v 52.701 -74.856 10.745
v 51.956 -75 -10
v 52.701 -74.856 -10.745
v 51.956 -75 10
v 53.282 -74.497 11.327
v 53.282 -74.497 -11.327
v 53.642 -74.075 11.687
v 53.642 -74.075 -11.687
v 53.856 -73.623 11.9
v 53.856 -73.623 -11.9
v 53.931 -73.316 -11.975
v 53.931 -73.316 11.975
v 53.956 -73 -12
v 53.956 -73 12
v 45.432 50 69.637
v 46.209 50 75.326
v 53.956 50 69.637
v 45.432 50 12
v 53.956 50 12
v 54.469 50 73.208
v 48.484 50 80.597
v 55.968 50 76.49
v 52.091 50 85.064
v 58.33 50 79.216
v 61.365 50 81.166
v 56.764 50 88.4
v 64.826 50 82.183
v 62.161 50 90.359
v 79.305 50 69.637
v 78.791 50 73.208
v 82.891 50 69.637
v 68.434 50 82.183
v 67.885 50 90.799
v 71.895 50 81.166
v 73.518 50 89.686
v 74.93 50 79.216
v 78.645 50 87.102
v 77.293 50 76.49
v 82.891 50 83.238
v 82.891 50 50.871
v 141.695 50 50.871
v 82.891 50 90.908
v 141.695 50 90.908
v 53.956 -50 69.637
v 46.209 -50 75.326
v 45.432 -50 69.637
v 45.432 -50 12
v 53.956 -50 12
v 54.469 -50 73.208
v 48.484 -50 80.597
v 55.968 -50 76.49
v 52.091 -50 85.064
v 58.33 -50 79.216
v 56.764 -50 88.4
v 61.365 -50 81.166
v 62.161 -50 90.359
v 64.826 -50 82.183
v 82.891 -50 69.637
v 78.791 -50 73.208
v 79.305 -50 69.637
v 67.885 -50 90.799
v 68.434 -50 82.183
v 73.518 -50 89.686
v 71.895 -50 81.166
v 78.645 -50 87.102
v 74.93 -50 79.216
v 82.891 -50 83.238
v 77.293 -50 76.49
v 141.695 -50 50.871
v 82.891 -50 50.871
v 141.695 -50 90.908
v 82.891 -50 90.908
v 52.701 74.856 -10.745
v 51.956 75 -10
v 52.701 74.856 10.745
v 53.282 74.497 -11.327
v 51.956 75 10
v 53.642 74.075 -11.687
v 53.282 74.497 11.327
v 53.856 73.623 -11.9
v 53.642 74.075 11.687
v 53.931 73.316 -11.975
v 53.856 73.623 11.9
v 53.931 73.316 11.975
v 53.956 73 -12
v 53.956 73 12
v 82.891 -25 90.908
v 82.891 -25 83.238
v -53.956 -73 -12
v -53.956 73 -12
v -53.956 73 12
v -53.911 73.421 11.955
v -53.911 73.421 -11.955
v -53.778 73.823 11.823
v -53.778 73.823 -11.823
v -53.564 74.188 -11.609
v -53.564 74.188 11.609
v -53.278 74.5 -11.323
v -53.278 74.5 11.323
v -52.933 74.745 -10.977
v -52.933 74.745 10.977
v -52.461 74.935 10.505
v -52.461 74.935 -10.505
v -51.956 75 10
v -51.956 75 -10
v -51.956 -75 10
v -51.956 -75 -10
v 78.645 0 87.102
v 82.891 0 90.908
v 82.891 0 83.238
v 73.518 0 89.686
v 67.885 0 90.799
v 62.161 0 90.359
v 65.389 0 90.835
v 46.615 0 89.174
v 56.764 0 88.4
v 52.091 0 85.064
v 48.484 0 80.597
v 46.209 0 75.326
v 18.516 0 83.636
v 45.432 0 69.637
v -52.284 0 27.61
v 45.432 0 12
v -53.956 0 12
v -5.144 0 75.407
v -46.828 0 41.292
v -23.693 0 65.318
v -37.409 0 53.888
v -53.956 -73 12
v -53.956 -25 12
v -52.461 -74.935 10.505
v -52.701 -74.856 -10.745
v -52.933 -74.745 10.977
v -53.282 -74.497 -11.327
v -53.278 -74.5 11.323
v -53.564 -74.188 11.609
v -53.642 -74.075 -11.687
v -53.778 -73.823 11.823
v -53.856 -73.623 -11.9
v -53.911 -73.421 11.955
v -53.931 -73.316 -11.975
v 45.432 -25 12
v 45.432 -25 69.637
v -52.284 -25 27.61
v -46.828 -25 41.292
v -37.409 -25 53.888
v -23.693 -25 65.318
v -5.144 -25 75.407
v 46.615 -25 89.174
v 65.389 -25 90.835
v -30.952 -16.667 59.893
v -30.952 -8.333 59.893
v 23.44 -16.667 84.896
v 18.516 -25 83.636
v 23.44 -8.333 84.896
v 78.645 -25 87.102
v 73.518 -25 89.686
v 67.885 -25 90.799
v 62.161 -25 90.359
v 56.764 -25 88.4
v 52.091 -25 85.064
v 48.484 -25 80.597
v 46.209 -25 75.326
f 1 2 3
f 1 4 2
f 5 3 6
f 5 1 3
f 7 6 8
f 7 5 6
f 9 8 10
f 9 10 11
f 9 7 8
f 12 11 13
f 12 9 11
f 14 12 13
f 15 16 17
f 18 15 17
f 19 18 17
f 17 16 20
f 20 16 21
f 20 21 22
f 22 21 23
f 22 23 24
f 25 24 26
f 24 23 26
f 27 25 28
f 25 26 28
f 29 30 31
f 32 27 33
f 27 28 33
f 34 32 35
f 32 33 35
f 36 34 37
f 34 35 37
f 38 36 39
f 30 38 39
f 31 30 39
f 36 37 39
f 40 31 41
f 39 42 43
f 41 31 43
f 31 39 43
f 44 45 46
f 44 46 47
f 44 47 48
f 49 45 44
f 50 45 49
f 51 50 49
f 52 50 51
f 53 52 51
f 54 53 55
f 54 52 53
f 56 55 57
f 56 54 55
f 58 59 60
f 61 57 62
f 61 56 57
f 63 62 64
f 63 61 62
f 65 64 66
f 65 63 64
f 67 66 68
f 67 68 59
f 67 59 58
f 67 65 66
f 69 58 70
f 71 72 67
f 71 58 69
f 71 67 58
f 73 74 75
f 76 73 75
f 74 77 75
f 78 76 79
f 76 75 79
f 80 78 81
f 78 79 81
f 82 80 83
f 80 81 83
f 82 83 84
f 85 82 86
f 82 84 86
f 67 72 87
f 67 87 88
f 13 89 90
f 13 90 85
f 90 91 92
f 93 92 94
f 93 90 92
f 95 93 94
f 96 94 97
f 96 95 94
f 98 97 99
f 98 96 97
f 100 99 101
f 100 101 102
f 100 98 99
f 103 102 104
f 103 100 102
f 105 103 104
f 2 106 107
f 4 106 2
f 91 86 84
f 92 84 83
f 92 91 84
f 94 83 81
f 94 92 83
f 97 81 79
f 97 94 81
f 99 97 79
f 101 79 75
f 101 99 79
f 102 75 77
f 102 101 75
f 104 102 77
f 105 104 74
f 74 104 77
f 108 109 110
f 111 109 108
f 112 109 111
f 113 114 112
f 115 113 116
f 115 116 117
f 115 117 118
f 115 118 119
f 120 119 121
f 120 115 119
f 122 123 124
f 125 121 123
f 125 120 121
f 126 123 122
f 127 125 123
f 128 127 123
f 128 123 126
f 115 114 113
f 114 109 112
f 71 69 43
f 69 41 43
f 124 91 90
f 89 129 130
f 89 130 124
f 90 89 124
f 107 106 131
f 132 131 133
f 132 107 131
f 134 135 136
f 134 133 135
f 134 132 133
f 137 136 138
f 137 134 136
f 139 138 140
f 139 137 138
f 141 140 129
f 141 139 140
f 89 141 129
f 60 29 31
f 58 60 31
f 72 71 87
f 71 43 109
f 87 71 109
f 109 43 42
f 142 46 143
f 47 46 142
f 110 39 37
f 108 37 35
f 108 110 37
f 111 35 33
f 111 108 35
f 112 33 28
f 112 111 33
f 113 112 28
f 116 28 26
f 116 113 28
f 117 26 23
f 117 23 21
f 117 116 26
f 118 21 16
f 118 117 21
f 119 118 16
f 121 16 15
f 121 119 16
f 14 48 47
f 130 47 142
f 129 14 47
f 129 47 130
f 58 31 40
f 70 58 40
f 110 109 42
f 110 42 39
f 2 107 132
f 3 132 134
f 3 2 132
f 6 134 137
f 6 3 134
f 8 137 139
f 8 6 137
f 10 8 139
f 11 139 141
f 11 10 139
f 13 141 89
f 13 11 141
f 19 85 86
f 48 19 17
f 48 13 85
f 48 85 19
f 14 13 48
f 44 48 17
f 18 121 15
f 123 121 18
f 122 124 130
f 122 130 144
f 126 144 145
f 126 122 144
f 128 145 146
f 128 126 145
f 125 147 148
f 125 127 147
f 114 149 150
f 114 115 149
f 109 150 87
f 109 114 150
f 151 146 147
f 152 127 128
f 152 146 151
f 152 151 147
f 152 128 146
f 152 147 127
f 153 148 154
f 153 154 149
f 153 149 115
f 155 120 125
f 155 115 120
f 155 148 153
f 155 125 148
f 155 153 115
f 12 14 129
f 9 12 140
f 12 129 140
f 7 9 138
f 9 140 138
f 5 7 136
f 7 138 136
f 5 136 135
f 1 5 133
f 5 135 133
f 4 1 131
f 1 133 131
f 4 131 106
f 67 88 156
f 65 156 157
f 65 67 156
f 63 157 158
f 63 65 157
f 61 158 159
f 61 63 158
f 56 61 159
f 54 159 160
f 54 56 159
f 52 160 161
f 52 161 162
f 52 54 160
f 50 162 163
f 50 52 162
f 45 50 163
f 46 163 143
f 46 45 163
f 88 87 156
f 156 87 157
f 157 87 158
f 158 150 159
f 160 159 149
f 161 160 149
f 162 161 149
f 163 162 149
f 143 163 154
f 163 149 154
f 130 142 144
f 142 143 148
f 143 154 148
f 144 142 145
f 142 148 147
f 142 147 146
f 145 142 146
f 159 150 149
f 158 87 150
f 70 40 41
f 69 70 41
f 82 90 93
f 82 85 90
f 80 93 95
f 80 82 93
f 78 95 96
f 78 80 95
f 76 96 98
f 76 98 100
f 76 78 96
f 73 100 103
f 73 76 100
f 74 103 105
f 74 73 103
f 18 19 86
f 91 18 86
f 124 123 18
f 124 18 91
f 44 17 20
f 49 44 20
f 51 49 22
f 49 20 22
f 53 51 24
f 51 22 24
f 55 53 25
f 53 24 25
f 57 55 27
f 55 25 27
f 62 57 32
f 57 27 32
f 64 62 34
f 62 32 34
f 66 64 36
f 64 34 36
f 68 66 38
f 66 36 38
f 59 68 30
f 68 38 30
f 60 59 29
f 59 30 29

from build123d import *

# Parameters (mm, degrees)
F2_DEPTH = 50
F3_DEPTH = 25
F4_DEPTH = 25
F6_DEPTH = 75
F7_R     = 2


# Not quite as in the source:
# - the program builds the solid bodies; features that only make, move or delete a surface that nothing else refers to are left out


with BuildPart() as f2:
    # F0 (on Front) → F2 (new body, symmetric)
    with BuildSketch(Plane.XZ):
        with BuildLine():
            ThreePointArc((86.0395411487, 78.1614595205), (84.6450154703, 80.8109382584), (82.8911252312, 83.2375219638))
            Line((82.8911252312, 83.2375219638), (82.8911252312, 69.6372875124))
            Line((82.8911252312, 69.6372875124), (98.3350202441, 69.6372875124))
            Line((98.3350202441, 69.6372875124), (98.3350202441, 78.1614595205))
            Line((98.3350202441, 78.1614595205), (86.0395411487, 78.1614595205))
        make_face()
        with BuildLine():
            Line((141.6950114063, 90.9081755561), (82.8911252312, 90.9081755561))
            Line((82.8911252312, 90.9081755561), (82.8911252312, 83.2375219638))
            ThreePointArc((82.8911252312, 83.2375219638), (84.6450154703, 80.8109382584), (86.0395411487, 78.1614595205))
            Line((86.0395411487, 78.1614595205), (98.3350202441, 78.1614595205))
            Line((98.3350202441, 78.1614595205), (98.3350202441, 69.6372875124))
            Line((98.3350202441, 69.6372875124), (82.8911252312, 69.6372875124))
            Line((82.8911252312, 69.6372875124), (82.8911252312, 50.8714897913))
            Line((82.8911252312, 50.8714897913), (141.6950114063, 50.8714897913))
            Line((141.6950114063, 50.8714897913), (141.6950114063, 90.9081755561))
        make_face()
        with BuildLine():
            Line((45.431509614, 69.6372875124), (45.431509614, 12))
            Line((45.431509614, 12), (53.955681622, 12))
            Line((53.955681622, 12), (53.955681622, 69.6372875124))
            ThreePointArc((53.955681622, 69.6372875124), (66.6301945598, 82.3118004502), (79.3047074976, 69.6372875124))
            Line((79.3047074976, 69.6372875124), (82.8911252312, 69.6372875124))
            Line((82.8911252312, 69.6372875124), (82.8911252312, 83.2375219638))
            ThreePointArc((82.8911252312, 83.2375219638), (59.3957665519, 89.563333152), (45.431509614, 69.6372875124))
        make_face()
    extrude(amount=F2_DEPTH, both=True)

    # F0 (on Front) → F3 (join)
    with BuildSketch(Plane.XZ):
        with BuildLine():
            add(Edge.make_bspline(
                [(-53.955681622, 12), (-55.4214757867, 72.6385811269), (29.6854469925, 93.0915244818), (82.8911252312, 90.9081755561)],
                knots=[0, 0, 0, 0, 157.9669228526, 157.9669228526, 157.9669228526, 157.9669228526], degree=3))
            Line((-53.955681622, 12), (45.431509614, 12))
            Line((45.431509614, 12), (45.431509614, 69.6372875124))
            ThreePointArc((45.431509614, 69.6372875124), (59.3957665519, 89.563333152), (82.8911252312, 83.2375219638))
            Line((82.8911252312, 83.2375219638), (82.8911252312, 90.9081755561))
        make_face()
        Polygon((45.431509614, 12), (-53.955681622, 12), (-53.955681622, -12), (53.955681622, -12), (53.955681622, 12), align=None)
        with BuildLine():
            Line((45.431509614, 69.6372875124), (45.431509614, 12))
            Line((45.431509614, 12), (53.955681622, 12))
            Line((53.955681622, 12), (53.955681622, 69.6372875124))
            ThreePointArc((53.955681622, 69.6372875124), (66.6301945598, 82.3118004502), (79.3047074976, 69.6372875124))
            Line((79.3047074976, 69.6372875124), (82.8911252312, 69.6372875124))
            Line((82.8911252312, 69.6372875124), (82.8911252312, 83.2375219638))
            ThreePointArc((82.8911252312, 83.2375219638), (59.3957665519, 89.563333152), (45.431509614, 69.6372875124))
        make_face()
        with BuildLine():
            Line((141.6950114063, 90.9081755561), (82.8911252312, 90.9081755561))
            Line((82.8911252312, 90.9081755561), (82.8911252312, 83.2375219638))
            ThreePointArc((82.8911252312, 83.2375219638), (84.6450154703, 80.8109382584), (86.0395411487, 78.1614595205))
            Line((86.0395411487, 78.1614595205), (98.3350202441, 78.1614595205))
            Line((98.3350202441, 78.1614595205), (98.3350202441, 69.6372875124))
            Line((98.3350202441, 69.6372875124), (82.8911252312, 69.6372875124))
            Line((82.8911252312, 69.6372875124), (82.8911252312, 50.8714897913))
            Line((82.8911252312, 50.8714897913), (141.6950114063, 50.8714897913))
            Line((141.6950114063, 50.8714897913), (141.6950114063, 90.9081755561))
        make_face()
        with BuildLine():
            ThreePointArc((86.0395411487, 78.1614595205), (84.6450154703, 80.8109382584), (82.8911252312, 83.2375219638))
            Line((82.8911252312, 83.2375219638), (82.8911252312, 69.6372875124))
            Line((82.8911252312, 69.6372875124), (98.3350202441, 69.6372875124))
            Line((98.3350202441, 69.6372875124), (98.3350202441, 78.1614595205))
            Line((98.3350202441, 78.1614595205), (86.0395411487, 78.1614595205))
        make_face()
    extrude(amount=F3_DEPTH)

    # F0 (on Front) → F4 (join, symmetric)
    with BuildSketch(Plane.XZ):
        Polygon((45.431509614, 12), (-53.955681622, 12), (-53.955681622, -12), (53.955681622, -12), (53.955681622, 12), align=None)
    extrude(amount=F4_DEPTH, both=True)

    # F1 (on face) → F6 (join, symmetric)
    with BuildSketch(Plane.XZ):
        Polygon((53.955681622, 12), (45.431509614, 12), (-53.955681622, 12), (-53.955681622, -12), (53.955681622, -12), align=None)
    extrude(amount=F6_DEPTH, both=True)

    # F7
    f7_edges = [f2.edges().sort_by_distance(p)[0] for p in [
        (53.955682, -75, 0),
        (0, -75, 12),
        (-53.955682, -75, 0),
        (0, -75, -12),
        (53.955682, 75, 0),
        (0, 75, 12),
        (-53.955682, 75, 0),
        (0, 75, -12),
    ]]
    fillet(f7_edges, radius=F7_R)


solid = f2.part
